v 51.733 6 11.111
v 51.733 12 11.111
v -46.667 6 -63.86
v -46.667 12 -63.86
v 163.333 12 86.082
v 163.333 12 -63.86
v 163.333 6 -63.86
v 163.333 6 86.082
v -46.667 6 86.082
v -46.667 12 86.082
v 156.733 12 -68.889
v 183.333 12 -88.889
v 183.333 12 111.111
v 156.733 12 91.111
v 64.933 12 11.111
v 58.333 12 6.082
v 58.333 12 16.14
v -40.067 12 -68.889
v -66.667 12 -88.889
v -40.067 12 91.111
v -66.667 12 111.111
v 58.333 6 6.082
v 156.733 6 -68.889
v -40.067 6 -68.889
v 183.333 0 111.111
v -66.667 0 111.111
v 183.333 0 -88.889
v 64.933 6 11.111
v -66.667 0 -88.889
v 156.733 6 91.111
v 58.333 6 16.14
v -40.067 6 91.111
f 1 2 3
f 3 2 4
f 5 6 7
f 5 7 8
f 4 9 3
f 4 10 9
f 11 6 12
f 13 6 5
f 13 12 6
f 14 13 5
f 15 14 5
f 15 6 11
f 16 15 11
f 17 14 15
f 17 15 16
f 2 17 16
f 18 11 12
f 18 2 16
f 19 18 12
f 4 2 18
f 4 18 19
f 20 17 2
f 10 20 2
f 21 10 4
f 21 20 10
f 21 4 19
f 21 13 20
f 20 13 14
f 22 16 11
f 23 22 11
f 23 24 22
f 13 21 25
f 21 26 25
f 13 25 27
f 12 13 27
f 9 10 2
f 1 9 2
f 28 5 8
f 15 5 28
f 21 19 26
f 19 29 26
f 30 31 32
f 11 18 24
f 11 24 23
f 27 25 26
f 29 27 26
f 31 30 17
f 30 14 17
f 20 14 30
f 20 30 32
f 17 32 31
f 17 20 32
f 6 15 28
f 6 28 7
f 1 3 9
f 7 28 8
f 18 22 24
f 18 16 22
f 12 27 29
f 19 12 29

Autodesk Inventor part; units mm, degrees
ref_plane "YZ Plane" through (0, 0, 0) normal (1, 0, 0) x (0, 1, 0)
ref_plane "XZ Plane" through (0, 0, 0) normal (0, 1, 0) x (-1, 0, 0)
ref_plane "XY Plane" through (0, 0, 0) normal (0, 0, 1) x (1, 0, 0)
sketch "Sketch1" plane through (0, 0, 0) normal (0, 1, 0) x (-1, 0, 0)
  line L0 (66.6667, 111.1111) -> (-183.3333, 111.1111)
  line L1 (-183.3333, 111.1111) -> (-183.3333, -88.8889)
  line L2 (-183.3333, -88.8889) -> (66.6667, -88.8889)
  line L3 (66.6667, -88.8889) -> (66.6667, 111.1111)
  point P0 (0, 0)
  dimension "d0" = 200
  dimension "d1" = 250
extrude "Extrusion1" add sketch "Sketch1" along normal blind 12
sketch "Sketch2" plane through (0, 12, 0) normal (0, 1, 0) x (1, 0, 0)
  line L0 (183.3333, -111.1111) -> (183.3333, 88.8889) projected
  line L1 (183.3333, 88.8889) -> (-66.6667, 88.8889) projected
  line L2 (-66.6667, 88.8889) -> (-66.6667, -111.1111) projected
  line L3 (-66.6667, -111.1111) -> (183.3333, -111.1111) projected
  line L4 (-46.6667, -91.1111) -> (-46.6667, 68.8889)
  line L5 (-46.6667, 68.8889) -> (163.3333, 68.8889)
  line L6 (163.3333, 68.8889) -> (163.3333, -91.1111)
  line L7 (163.3333, -91.1111) -> (-46.6667, -91.1111)
  line L8 (-46.6667, -91.1111) -> (163.3333, 68.8889)
  line L9 (163.3333, -91.1111) -> (-46.6667, 68.8889)
  line L10 (160.9092, -94.2928) -> (-49.0908, 65.7072)
  line L11 (165.7575, -87.9294) -> (-44.2425, 72.0706)
  line L12 (-49.0908, -87.9294) -> (160.9092, 72.0706)
  line L13 (-44.2425, -94.2928) -> (165.7575, 65.7072)
  point P0 (0, 0)
  point P1 (58.3333, -16.1398)
  point P2 (-40.0665, -91.1111)
  point P3 (156.7331, -91.1111)
  point P4 (163.3333, 63.8602)
  point P5 (64.9335, -11.1111)
  point P6 (163.3333, -86.0824)
  point P7 (58.3333, -6.0824)
  point P8 (156.7331, 68.8889)
  point P9 (-40.0665, 68.8889)
  point P10 (-46.6667, -86.0824)
  point P11 (51.7331, -11.1111)
  point P12 (-46.6667, 63.8602)
  dimension "d4" = 20
  dimension "d5" = 4
  dimension "d6" = 4
  dimension "d7" = 4
  dimension "d8" = 4
extrude "Extrusion2" cut sketch "Sketch2" against normal blind 6 contours L4 L10 L12 | L13 L10 L7 | L5 L12 L11 | L11 L13 L6
properties part number "planeDerzavki" material "Aluminum 6061"
